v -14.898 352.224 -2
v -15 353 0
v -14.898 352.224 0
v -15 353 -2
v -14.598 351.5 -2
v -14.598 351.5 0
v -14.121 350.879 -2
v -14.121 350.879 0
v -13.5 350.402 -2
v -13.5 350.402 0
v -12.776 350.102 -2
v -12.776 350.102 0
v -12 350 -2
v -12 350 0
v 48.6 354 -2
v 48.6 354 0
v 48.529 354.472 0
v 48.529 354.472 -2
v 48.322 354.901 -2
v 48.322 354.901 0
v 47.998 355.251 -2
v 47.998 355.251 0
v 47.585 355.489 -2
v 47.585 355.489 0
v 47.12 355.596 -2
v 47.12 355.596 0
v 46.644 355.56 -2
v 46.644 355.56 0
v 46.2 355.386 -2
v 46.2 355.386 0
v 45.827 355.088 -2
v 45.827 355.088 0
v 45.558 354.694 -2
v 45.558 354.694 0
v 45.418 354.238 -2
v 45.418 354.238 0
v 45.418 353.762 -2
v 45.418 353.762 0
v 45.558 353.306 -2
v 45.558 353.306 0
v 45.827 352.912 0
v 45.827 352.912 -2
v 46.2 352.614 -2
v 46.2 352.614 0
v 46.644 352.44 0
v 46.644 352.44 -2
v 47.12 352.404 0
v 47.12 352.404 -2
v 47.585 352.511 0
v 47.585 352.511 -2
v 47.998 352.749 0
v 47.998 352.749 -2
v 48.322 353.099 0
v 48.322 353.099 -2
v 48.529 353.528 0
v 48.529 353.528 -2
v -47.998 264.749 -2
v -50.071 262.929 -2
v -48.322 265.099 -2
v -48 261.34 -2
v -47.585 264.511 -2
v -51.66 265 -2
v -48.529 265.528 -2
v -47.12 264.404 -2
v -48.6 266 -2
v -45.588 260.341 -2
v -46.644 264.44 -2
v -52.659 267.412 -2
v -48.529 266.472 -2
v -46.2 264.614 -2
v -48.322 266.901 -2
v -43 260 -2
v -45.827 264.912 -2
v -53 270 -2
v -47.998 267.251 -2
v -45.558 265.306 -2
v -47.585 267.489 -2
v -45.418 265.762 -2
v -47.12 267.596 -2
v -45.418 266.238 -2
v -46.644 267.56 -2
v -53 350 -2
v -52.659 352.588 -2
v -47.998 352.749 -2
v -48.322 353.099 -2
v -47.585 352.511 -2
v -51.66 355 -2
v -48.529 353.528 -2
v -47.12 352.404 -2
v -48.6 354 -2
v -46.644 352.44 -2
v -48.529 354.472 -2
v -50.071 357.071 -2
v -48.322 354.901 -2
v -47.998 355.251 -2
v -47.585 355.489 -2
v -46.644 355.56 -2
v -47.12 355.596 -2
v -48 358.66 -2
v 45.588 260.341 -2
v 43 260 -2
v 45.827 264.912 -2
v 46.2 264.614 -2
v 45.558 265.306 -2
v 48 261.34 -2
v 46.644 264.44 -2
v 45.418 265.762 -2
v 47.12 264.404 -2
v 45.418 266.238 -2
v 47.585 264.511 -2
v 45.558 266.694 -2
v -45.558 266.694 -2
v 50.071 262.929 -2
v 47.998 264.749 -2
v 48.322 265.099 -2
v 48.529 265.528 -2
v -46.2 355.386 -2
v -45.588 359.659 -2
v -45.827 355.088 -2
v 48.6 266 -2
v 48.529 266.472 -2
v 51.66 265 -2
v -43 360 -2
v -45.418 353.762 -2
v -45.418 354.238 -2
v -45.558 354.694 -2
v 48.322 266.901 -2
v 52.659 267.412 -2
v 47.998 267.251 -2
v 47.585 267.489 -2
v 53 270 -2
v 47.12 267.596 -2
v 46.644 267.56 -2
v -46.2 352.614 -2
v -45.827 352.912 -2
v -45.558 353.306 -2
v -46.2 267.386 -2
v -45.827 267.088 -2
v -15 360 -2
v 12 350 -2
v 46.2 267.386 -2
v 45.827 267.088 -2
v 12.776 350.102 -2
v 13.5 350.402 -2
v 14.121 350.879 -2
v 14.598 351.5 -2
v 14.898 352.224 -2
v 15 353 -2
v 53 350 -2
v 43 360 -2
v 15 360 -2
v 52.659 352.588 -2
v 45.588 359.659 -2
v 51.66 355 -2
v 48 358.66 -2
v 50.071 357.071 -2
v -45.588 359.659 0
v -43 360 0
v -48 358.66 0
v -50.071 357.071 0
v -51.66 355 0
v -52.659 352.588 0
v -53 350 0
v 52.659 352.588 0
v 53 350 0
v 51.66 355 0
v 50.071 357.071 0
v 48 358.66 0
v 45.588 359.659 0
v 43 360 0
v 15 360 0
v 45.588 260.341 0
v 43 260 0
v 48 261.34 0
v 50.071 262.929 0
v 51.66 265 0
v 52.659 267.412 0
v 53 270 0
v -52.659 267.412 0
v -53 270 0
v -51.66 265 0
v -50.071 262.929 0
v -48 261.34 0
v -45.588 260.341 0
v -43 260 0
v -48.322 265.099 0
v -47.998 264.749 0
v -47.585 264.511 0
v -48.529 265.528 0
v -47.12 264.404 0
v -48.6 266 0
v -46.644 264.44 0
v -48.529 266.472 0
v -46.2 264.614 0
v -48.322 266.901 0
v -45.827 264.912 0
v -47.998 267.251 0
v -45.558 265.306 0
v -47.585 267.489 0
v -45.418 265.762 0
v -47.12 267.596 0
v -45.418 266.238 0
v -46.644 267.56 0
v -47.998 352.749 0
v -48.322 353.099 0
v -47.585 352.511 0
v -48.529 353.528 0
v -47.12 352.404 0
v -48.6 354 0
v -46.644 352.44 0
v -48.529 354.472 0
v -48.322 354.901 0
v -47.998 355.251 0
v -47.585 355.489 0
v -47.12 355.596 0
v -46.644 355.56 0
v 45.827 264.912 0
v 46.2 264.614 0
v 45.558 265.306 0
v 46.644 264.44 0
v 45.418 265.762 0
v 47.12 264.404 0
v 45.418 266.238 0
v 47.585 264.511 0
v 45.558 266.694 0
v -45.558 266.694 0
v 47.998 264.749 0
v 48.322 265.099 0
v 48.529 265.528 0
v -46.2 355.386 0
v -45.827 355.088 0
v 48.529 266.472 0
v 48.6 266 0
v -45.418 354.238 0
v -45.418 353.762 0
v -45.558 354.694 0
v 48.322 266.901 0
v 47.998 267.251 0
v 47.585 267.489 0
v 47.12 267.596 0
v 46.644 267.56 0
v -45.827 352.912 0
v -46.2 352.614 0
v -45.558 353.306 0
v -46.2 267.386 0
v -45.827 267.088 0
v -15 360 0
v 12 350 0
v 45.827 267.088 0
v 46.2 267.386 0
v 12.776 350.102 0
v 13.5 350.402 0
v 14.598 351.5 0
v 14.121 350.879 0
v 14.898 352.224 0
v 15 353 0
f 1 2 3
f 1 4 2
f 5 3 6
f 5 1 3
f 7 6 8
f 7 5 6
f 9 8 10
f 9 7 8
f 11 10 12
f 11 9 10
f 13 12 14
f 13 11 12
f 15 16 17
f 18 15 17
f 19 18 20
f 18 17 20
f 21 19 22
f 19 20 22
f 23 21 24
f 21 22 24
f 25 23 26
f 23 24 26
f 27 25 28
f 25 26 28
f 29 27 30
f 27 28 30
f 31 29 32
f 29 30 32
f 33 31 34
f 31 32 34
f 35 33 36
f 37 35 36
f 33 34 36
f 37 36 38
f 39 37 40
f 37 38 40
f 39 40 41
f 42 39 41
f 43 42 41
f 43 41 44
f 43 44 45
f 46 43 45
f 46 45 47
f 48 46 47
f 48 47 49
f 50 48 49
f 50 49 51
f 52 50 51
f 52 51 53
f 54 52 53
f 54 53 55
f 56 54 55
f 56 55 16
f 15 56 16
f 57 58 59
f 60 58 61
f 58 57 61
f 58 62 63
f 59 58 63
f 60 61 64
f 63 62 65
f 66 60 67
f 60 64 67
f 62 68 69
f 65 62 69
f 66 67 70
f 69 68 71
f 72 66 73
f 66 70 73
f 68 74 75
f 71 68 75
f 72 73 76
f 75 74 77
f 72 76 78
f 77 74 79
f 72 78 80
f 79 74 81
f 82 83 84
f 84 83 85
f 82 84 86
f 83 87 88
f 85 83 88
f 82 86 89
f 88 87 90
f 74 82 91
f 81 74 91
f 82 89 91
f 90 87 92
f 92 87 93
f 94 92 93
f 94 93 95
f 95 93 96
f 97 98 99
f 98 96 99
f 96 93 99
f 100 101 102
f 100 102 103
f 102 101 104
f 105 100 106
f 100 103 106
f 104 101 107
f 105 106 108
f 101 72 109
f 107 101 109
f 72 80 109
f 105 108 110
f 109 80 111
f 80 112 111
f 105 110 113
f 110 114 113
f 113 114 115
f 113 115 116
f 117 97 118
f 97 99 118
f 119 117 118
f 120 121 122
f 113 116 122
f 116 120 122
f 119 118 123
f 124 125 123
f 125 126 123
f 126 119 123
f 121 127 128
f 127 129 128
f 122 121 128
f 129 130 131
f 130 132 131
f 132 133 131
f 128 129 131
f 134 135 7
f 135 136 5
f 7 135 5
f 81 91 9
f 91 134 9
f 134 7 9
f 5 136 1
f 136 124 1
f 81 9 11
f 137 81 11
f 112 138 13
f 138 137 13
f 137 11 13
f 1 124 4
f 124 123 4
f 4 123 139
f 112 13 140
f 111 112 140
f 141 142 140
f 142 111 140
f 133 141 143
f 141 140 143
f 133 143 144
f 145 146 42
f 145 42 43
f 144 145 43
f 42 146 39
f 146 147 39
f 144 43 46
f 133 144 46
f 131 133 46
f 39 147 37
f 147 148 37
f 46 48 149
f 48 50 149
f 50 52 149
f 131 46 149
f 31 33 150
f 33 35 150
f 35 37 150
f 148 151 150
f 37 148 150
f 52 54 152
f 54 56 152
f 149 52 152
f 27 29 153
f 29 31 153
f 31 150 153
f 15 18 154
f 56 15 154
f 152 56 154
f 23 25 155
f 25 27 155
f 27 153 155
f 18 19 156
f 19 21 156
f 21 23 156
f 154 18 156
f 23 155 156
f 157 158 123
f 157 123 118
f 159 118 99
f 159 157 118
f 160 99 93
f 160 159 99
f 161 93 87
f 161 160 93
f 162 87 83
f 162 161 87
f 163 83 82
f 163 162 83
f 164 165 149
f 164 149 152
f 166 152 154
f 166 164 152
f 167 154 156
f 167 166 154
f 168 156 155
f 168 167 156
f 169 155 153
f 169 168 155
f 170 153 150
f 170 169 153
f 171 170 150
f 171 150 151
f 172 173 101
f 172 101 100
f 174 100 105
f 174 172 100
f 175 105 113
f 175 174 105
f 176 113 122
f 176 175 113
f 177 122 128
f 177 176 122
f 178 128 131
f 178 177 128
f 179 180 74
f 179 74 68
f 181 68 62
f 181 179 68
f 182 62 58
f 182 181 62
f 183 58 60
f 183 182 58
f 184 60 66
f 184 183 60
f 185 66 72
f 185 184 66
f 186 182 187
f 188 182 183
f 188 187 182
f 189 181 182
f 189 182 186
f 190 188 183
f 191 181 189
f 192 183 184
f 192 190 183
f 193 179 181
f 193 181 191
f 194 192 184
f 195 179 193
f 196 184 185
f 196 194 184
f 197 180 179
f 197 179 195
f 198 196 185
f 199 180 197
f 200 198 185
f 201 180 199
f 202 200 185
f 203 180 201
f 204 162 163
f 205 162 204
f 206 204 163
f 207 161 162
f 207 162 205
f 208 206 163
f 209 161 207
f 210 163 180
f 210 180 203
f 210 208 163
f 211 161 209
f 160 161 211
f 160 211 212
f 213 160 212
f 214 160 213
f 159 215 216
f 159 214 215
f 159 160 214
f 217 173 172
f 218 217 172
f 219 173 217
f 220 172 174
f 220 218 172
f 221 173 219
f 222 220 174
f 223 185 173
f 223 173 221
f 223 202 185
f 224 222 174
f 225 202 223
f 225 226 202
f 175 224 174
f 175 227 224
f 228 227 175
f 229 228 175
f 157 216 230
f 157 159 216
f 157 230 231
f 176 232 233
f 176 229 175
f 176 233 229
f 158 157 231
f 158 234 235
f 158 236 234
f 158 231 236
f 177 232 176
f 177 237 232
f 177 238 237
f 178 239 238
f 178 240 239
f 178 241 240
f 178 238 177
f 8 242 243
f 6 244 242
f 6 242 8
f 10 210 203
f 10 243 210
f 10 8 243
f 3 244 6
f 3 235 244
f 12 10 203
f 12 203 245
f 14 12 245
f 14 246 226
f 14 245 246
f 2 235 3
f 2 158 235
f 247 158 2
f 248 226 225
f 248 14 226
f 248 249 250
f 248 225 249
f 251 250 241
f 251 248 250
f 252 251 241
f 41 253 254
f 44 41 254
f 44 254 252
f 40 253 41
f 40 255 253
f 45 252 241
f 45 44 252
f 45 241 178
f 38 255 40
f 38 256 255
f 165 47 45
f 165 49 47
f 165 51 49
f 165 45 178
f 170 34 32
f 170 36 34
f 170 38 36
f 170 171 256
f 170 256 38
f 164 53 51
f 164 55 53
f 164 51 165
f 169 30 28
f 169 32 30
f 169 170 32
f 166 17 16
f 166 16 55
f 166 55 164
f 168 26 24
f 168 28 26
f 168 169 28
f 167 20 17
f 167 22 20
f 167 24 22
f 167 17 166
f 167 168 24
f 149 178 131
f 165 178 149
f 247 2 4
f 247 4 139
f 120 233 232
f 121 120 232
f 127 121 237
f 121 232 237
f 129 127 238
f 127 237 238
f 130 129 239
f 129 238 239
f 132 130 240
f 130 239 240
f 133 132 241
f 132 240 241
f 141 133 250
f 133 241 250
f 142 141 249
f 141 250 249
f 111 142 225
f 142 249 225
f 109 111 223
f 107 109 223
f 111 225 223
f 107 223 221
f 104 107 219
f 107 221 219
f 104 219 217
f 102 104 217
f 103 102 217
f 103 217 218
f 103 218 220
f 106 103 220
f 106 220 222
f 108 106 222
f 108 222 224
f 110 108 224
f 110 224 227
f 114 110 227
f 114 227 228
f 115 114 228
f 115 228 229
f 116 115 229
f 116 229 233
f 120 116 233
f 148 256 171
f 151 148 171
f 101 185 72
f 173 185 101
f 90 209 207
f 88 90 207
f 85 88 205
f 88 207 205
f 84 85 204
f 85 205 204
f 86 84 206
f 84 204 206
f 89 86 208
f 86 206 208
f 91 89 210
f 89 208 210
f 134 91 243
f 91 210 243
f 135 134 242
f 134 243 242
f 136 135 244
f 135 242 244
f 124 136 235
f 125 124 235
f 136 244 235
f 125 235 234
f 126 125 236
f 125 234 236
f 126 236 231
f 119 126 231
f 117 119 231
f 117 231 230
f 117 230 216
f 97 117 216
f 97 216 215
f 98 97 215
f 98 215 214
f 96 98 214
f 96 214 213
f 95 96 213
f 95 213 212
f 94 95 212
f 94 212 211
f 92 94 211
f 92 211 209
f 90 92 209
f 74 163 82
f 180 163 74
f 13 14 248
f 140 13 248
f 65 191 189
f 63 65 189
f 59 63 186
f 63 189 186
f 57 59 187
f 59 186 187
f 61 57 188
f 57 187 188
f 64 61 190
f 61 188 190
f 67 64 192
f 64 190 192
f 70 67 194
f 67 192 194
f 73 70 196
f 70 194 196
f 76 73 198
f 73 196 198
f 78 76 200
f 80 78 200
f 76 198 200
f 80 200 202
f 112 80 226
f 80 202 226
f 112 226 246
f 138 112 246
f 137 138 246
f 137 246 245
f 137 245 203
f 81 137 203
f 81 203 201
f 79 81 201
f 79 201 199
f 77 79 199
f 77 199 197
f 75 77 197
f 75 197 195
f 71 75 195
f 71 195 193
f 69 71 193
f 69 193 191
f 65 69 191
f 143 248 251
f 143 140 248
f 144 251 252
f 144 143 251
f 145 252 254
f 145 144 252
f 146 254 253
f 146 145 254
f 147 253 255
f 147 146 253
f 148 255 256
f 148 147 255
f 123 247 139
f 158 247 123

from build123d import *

# Parameters (mm, degrees)
BOSS_EXTRUDE1_DEPTH = 2
SKETCH2_W           = 30
SKETCH2_H           = 10
CUT_EXTRUDE1_DEPTH  = 364.88597115
FILLET1_R           = 3
SKETCH3_R           = 1.6
CUT_EXTRUDE2_DEPTH  = 364.88597115


with BuildPart() as part:
    # Sketch1 → Boss-Extrude1 (new body)
    with BuildSketch(Plane.XY):
        with BuildLine():
            Line((-43, 260), (43, 260))
            ThreePointArc((43, 260), (50.071067812, 262.928932188), (53, 270))
            Line((53, 270), (53, 350))
            ThreePointArc((53, 350), (50.071067812, 357.071067812), (43, 360))
            Line((43, 360), (-43, 360))
            ThreePointArc((-43, 360), (-50.071067812, 357.071067812), (-53, 350))
            Line((-53, 350), (-53, 270))
            ThreePointArc((-53, 270), (-50.071067812, 262.928932188), (-43, 260))
        make_face()
    extrude(amount=-BOSS_EXTRUDE1_DEPTH)

    # Sketch2 → Cut-Extrude1 (cut, through all)
    with BuildSketch(Plane.XY):
        with Locations((0, 355)):
            Rectangle(SKETCH2_W, SKETCH2_H)
    extrude(amount=-CUT_EXTRUDE1_DEPTH, mode=Mode.SUBTRACT)

    # Fillet1
    fillet1_edges = [part.edges().sort_by_distance(p)[0] for p in [
        (-15, 350, -1),
        (15, 350, -1),
    ]]
    fillet(fillet1_edges, radius=FILLET1_R)

    # Sketch3 → Cut-Extrude2 (cut, through all)
    with BuildSketch(Plane.XY):
        with Locations((47, 354)):
            Circle(SKETCH3_R)
        with Locations((47, 266)):
            Circle(SKETCH3_R)
        with Locations(Location((-47, 266, 0), (0, 0, 180))):
            Circle(SKETCH3_R)
        with Locations(Location((-47, 354, 0), (0, 0, 180))):
            Circle(SKETCH3_R)
    extrude(amount=-CUT_EXTRUDE2_DEPTH, mode=Mode.SUBTRACT)


solid = part.part
